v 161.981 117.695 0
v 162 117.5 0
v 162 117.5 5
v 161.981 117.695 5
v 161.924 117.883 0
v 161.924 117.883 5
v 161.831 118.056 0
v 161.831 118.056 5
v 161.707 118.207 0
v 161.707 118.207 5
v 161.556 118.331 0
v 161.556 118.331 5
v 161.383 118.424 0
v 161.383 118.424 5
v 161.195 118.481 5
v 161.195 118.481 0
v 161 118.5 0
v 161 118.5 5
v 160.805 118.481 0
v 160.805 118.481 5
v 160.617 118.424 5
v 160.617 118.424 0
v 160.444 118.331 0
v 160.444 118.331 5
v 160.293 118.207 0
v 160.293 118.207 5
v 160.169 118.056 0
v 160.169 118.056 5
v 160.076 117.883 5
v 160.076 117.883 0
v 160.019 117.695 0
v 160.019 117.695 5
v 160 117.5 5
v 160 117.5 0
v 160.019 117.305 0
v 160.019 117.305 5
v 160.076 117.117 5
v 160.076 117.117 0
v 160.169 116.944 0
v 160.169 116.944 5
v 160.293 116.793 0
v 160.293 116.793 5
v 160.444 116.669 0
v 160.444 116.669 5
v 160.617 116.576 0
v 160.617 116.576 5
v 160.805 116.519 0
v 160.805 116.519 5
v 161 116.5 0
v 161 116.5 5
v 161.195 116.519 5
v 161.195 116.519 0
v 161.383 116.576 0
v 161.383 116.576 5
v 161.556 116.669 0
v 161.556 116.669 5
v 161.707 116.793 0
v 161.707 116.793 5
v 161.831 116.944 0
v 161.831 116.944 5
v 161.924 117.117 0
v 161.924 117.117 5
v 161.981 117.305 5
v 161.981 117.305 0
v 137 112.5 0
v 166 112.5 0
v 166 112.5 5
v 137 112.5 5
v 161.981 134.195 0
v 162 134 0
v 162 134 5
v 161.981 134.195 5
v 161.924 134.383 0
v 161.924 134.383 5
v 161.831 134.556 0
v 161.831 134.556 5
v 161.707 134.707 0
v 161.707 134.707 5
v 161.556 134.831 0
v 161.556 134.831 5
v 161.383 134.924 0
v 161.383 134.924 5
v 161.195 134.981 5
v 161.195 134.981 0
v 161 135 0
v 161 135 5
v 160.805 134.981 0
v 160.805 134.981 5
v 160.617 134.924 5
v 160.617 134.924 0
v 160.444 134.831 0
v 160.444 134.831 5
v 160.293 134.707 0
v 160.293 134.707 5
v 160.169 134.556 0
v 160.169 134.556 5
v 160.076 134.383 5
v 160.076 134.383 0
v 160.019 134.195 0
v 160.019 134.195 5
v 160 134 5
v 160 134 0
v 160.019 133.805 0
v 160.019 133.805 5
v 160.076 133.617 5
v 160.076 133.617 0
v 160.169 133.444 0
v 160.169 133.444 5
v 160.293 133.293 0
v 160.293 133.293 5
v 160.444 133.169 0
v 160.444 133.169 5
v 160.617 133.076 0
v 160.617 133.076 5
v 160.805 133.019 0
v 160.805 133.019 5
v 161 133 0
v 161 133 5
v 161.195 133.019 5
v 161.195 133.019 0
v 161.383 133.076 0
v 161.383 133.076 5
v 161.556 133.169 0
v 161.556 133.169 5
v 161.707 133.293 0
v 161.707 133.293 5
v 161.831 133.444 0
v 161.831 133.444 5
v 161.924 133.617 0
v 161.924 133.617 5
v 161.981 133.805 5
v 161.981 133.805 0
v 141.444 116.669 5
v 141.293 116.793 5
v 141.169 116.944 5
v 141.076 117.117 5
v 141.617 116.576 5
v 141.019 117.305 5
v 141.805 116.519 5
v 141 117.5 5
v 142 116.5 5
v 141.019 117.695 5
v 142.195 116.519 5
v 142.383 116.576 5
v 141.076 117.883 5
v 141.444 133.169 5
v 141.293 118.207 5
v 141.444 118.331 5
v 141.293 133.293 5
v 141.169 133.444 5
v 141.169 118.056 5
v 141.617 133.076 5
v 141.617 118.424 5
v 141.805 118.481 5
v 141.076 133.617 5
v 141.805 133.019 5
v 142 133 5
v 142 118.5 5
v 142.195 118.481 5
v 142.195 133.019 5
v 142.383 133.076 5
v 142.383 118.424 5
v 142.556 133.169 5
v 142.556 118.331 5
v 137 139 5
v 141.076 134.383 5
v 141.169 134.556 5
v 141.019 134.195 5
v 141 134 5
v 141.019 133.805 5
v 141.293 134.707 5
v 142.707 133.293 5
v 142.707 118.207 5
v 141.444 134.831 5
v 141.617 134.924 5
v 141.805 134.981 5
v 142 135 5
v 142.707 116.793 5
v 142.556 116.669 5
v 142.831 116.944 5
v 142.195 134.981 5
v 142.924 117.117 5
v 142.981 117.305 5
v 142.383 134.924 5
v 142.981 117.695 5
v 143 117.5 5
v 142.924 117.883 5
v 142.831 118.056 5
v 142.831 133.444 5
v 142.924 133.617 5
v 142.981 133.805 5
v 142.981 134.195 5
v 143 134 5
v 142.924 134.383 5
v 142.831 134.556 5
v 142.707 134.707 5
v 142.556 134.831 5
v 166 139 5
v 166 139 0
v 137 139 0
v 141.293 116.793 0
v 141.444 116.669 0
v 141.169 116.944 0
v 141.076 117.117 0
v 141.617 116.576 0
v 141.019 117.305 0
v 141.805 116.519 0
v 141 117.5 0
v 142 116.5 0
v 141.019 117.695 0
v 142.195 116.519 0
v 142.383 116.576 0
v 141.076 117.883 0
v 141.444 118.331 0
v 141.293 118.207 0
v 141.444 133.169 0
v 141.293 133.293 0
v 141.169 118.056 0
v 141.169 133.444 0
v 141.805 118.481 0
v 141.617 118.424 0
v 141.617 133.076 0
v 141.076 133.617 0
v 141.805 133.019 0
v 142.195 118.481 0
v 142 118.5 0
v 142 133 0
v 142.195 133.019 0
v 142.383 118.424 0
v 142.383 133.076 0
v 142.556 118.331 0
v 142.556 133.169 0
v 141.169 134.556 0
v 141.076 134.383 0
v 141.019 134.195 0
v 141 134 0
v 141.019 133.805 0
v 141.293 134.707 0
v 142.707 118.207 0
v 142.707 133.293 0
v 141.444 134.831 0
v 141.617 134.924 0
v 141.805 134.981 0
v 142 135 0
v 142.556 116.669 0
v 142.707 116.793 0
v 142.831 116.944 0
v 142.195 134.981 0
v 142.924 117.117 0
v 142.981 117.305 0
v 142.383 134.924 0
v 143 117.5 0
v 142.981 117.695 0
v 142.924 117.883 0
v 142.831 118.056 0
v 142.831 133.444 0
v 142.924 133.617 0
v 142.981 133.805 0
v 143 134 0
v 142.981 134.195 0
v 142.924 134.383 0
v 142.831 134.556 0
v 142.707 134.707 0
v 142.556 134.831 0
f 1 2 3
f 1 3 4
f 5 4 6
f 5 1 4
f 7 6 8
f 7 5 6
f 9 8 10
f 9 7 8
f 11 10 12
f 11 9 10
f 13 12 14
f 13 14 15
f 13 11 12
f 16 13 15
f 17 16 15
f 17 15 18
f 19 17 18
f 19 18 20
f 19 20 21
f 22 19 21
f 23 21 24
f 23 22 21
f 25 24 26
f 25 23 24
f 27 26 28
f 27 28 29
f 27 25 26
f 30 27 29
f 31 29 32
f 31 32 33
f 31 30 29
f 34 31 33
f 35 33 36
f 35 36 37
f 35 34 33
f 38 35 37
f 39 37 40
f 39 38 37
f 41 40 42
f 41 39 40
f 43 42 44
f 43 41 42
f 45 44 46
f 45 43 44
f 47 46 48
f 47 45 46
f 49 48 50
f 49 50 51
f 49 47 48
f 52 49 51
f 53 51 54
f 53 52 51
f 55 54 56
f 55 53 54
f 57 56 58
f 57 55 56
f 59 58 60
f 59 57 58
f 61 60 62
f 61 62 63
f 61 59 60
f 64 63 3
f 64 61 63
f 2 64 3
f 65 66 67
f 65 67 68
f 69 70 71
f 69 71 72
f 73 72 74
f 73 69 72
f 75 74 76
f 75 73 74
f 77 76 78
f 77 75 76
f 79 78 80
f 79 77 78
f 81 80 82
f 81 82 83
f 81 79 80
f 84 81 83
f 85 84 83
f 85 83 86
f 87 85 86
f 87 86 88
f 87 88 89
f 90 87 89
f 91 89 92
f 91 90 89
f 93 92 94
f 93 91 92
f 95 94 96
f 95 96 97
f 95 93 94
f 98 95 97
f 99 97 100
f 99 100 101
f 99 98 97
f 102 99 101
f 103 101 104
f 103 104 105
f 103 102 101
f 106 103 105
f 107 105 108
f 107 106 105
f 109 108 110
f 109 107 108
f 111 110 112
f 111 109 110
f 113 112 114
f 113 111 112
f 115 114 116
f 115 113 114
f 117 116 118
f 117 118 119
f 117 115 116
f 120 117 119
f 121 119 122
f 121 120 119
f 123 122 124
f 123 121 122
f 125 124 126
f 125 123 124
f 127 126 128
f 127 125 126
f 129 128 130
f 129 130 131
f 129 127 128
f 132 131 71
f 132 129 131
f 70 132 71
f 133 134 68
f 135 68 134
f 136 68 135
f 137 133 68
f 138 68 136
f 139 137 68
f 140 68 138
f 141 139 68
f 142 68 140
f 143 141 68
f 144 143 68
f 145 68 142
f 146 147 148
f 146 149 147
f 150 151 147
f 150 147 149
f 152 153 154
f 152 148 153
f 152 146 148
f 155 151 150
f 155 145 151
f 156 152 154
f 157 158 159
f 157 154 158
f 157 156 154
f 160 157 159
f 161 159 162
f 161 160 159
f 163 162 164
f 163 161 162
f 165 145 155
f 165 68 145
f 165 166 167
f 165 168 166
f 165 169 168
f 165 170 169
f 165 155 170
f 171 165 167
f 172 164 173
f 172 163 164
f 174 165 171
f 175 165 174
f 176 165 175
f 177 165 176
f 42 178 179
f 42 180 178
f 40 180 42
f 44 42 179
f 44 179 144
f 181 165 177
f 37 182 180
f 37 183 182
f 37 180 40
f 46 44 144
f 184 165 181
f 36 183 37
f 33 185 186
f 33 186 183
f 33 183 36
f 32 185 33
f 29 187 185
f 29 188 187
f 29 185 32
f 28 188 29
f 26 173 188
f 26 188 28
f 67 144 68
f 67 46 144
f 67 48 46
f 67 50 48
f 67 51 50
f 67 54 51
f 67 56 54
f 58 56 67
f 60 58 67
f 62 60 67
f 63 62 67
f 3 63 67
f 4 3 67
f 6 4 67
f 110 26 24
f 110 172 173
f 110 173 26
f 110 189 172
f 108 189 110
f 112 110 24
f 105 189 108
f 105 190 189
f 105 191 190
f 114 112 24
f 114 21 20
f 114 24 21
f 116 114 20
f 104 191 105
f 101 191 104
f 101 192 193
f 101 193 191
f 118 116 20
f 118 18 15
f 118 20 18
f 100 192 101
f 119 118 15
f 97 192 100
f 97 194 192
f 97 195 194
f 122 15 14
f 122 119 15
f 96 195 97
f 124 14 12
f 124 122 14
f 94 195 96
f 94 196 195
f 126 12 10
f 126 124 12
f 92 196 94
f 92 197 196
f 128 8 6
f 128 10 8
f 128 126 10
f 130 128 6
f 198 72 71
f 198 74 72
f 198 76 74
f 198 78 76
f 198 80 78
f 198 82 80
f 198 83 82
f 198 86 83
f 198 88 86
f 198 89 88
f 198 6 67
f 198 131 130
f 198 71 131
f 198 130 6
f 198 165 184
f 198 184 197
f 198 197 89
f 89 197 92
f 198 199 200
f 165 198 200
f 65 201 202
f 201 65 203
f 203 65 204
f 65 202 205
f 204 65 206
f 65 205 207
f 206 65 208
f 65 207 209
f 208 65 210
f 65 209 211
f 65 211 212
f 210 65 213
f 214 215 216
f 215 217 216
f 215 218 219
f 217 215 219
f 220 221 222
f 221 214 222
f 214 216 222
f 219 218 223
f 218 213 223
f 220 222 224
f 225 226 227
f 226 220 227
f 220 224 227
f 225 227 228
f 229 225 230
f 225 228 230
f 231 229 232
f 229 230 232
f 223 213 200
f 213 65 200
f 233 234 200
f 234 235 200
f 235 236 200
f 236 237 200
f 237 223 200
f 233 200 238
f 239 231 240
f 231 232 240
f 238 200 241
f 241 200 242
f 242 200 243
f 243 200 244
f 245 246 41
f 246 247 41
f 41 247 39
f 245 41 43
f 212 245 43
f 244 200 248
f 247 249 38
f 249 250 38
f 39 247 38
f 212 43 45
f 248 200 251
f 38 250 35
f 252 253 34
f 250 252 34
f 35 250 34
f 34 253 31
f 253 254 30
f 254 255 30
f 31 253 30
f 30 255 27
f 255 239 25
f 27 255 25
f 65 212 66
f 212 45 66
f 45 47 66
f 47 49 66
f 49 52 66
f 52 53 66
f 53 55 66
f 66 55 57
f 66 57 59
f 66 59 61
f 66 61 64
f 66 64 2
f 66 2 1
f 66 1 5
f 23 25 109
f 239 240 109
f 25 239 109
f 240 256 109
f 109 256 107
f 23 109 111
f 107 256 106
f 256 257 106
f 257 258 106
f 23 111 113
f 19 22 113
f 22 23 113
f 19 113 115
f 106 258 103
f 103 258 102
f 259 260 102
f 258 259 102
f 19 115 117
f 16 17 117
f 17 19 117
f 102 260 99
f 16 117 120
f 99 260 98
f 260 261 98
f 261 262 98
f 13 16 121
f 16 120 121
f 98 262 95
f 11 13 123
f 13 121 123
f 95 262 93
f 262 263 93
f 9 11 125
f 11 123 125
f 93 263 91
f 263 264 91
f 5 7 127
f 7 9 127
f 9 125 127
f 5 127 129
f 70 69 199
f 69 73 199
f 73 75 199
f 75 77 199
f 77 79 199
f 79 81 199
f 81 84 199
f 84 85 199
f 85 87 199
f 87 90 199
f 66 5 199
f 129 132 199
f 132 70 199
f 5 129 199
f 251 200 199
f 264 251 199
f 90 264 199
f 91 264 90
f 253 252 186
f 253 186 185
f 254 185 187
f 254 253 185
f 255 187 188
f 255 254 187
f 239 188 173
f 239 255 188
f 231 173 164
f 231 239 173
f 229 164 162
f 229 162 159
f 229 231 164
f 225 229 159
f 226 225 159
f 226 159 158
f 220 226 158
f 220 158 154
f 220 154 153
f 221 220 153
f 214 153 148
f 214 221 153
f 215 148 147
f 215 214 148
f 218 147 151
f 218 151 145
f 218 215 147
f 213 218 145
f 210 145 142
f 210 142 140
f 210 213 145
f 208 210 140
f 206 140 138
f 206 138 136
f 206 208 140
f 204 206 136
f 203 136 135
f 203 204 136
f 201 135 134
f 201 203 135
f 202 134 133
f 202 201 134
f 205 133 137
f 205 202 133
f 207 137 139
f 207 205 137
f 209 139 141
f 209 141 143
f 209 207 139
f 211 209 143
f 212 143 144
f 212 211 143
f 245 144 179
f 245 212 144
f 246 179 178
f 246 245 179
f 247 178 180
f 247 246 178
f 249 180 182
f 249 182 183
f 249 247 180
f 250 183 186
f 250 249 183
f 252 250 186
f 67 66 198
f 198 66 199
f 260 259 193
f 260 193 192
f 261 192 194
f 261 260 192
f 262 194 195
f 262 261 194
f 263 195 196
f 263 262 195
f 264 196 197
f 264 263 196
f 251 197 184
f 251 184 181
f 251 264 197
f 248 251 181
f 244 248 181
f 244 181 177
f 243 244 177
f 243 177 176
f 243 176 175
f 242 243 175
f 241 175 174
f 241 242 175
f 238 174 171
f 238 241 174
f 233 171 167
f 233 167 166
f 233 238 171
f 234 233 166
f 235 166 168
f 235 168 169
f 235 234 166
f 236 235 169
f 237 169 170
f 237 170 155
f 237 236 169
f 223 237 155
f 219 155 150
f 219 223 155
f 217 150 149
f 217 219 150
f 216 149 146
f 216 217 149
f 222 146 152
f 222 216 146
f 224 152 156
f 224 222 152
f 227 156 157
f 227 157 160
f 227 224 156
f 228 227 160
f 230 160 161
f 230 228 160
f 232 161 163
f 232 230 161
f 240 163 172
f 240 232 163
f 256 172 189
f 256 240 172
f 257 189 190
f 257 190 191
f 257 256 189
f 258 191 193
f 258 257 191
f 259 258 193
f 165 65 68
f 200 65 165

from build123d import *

# Parameters (mm, degrees)
SKETCH1_W           = 66
SKETCH1_H           = 50
SKETCH1_R           = 1
BOSS_EXTRUDE1_DEPTH = 5
SKETCH2_R           = 1
CUT_EXTRUDE1_DEPTH  = 388.996134001
SKETCH3_R           = 1
SKETCH3_W           = 20
SKETCH3_H           = 5
CUT_EXTRUDE2_DEPTH  = 388.996134001
CUT_EXTRUDE3_DEPTH  = 388.996134001
SKETCH5_OUTSIDE_W   = 171.322
SKETCH5_OUTSIDE_H   = 295.322
SKETCH5_OUTSIDE_W_2 = 29
SKETCH5_OUTSIDE_H_2 = 26.5
CUT_EXTRUDE4_DEPTH  = 388.996134001


with BuildPart() as part:
    # Sketch1 → Boss-Extrude1 (new body)
    # profile 1 of 3: a face of its own
    with BuildSketch(Plane.XY):
        with Locations((-33, 85)):
            Rectangle(SKETCH1_W, SKETCH1_H)
    # profile 2 of 3: a face of its own
    with BuildSketch(Plane.XY):
        Polygon((0, 60), (0, 0), (180, 0), (180, 60), (180, 110), (180, 300), (130, 300), (130, 150), (50, 150), (50, 300), (0, 300), (0, 110), align=None)
        with Locations((19, 117.5)):
            Circle(SKETCH1_R, mode=Mode.SUBTRACT)
        with Locations((38, 117.5)):
            Circle(SKETCH1_R, mode=Mode.SUBTRACT)
        with Locations((19, 134)):
            Circle(SKETCH1_R, mode=Mode.SUBTRACT)
        with Locations((38, 134)):
            Circle(SKETCH1_R, mode=Mode.SUBTRACT)
        with Locations((142, 117.5)):
            Circle(SKETCH1_R, mode=Mode.SUBTRACT)
        with Locations((161, 117.5)):
            Circle(SKETCH1_R, mode=Mode.SUBTRACT)
        with Locations((142, 134)):
            Circle(SKETCH1_R, mode=Mode.SUBTRACT)
        with Locations((161, 134)):
            Circle(SKETCH1_R, mode=Mode.SUBTRACT)
    # profile 3 of 3: a face of its own
    with BuildSketch(Plane.XY):
        with Locations((213, 85)):
            Rectangle(SKETCH1_W, SKETCH1_H)
    extrude(amount=BOSS_EXTRUDE1_DEPTH)

    # Sketch2 → Cut-Extrude1 (cut, through all)
    with BuildSketch(Plane.XY.offset(5)):
        with Locations((-58, 103)):
            Circle(SKETCH2_R)
        with Locations((-58, 67)):
            Circle(SKETCH2_R)
        with Locations(Location((238, 67, 0), (0, 0, 180))):
            Circle(SKETCH2_R)
        with Locations(Location((238, 103, 0), (0, 0, 180))):
            Circle(SKETCH2_R)
    extrude(amount=-CUT_EXTRUDE1_DEPTH, mode=Mode.SUBTRACT)

    # Sketch3 → Cut-Extrude2 (cut, through all)
    with BuildSketch(Plane.XY.offset(5)):
        with Locations((19, 77)):
            Circle(SKETCH3_R)
        with Locations((19, 99.5)):
            Circle(SKETCH3_R)
        with Locations(Location((161, 77, 0), (0, 0, 180))):
            Circle(SKETCH3_R)
        with Locations(Location((161, 99.5, 0), (0, 0, 180))):
            Circle(SKETCH3_R)
        with Locations((-6, 90)):
            Rectangle(SKETCH3_W, SKETCH3_H)
        with Locations((186, 90)):
            Rectangle(SKETCH3_W, SKETCH3_H)
    extrude(amount=-CUT_EXTRUDE2_DEPTH, mode=Mode.SUBTRACT)

    # Sketch4 → Cut-Extrude3 (cut, through all)
    with BuildSketch(Plane.XY.offset(5)):
        Polygon((180, 60), (130, 60), (130, 150), (65.062754068, 311.897276324), (-51.051297303, 321.248743549), (-107.939389585, -9.16976505), (175.332138424, -20.859099081), (198.321162017, 8.753880463), align=None)
    extrude(amount=-CUT_EXTRUDE3_DEPTH, mode=Mode.SUBTRACT)

    # Sketch5 outside → Cut-Extrude4 (cut, through all)
    with BuildSketch(Plane(origin=(0, 0, 0), x_dir=(-1, 0, 0), z_dir=(0, 0, -1))):
        with Locations((-188, 180)):
            Rectangle(SKETCH5_OUTSIDE_W, SKETCH5_OUTSIDE_H)
        with Locations((-151.5, 125.75)):
            Rectangle(SKETCH5_OUTSIDE_W_2, SKETCH5_OUTSIDE_H_2, mode=Mode.SUBTRACT)
    extrude(amount=-CUT_EXTRUDE4_DEPTH, mode=Mode.SUBTRACT)


solid = part.part
